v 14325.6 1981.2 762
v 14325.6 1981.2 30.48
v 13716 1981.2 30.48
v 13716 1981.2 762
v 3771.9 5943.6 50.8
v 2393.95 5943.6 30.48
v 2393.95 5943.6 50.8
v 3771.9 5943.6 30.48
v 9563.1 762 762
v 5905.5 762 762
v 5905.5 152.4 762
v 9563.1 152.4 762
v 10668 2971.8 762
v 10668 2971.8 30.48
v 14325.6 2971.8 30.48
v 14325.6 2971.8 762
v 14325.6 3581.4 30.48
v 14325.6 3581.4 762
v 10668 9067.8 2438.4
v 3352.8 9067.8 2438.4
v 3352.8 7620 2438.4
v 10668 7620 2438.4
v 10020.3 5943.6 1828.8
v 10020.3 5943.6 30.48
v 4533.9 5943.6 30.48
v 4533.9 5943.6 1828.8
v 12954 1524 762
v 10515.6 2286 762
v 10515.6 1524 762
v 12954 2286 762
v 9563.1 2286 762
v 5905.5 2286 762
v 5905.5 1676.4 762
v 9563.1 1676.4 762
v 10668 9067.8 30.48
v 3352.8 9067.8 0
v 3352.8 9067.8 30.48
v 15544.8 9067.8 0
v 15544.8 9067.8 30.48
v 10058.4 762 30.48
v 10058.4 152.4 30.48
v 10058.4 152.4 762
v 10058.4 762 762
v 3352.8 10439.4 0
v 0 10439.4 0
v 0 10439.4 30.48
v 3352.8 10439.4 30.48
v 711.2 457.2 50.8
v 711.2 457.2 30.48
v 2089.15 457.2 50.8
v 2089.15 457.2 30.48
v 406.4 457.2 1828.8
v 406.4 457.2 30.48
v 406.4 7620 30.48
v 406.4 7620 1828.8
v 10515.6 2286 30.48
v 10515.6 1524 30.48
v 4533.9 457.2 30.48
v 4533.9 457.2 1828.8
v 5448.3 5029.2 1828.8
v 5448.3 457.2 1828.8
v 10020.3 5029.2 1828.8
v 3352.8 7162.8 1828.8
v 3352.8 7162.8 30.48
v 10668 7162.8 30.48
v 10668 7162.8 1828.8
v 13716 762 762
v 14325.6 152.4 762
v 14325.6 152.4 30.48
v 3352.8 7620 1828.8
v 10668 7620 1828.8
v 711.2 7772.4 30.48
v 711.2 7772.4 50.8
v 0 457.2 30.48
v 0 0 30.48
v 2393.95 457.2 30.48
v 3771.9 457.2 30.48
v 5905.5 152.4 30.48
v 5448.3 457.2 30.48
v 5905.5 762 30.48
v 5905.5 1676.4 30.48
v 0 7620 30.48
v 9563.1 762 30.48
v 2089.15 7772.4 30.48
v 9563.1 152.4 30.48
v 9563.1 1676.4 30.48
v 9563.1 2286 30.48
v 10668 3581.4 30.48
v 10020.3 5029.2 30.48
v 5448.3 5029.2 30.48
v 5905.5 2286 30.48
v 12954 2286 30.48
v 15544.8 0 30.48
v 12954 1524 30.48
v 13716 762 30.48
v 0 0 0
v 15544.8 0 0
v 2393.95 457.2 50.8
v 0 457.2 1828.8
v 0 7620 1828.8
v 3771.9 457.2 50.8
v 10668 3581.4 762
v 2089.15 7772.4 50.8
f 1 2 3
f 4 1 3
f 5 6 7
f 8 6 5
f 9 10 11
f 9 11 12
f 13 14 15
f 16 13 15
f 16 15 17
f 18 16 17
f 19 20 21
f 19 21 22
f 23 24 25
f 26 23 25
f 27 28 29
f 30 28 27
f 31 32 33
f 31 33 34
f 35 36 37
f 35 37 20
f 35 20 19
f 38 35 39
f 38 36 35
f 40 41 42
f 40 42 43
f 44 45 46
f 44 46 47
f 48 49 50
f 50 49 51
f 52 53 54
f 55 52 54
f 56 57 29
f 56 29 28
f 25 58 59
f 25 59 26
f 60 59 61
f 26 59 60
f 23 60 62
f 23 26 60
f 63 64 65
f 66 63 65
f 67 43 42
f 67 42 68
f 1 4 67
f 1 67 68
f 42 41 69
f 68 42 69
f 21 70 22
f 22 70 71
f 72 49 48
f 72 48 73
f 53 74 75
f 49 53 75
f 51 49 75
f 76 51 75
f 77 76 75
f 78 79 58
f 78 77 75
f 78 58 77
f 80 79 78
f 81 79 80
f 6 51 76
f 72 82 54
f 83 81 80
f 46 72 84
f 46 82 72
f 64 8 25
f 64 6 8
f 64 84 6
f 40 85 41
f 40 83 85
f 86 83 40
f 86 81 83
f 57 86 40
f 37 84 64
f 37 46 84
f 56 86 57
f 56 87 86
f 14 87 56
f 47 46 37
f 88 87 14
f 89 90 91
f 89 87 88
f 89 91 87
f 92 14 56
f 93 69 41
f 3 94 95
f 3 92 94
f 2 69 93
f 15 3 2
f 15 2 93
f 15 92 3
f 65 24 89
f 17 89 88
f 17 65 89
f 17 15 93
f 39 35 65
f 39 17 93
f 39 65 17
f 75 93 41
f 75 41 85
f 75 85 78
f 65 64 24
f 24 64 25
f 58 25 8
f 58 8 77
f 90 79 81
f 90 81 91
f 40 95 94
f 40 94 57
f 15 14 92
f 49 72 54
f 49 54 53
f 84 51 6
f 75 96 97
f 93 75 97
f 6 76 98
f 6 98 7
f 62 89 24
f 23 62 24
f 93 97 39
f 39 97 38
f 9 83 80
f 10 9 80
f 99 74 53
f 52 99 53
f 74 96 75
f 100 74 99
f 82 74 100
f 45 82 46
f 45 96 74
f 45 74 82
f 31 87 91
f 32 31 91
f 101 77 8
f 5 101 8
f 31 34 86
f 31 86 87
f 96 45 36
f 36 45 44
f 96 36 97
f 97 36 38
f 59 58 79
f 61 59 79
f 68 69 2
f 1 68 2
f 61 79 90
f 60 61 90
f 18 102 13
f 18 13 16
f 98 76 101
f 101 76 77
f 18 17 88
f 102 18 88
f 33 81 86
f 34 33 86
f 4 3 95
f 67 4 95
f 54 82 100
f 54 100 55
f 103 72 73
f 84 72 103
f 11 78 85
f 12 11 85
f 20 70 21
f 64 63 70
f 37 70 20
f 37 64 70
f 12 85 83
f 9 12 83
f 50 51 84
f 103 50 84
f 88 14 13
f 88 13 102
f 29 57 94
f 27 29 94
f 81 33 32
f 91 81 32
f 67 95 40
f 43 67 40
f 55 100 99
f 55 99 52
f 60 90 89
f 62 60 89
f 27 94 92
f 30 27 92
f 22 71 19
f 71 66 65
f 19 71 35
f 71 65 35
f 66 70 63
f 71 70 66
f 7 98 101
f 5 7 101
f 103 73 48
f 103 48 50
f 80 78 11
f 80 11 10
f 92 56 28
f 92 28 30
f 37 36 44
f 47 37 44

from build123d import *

# Parameters (mm, degrees)
F0_W     = 1377.95
F0_H     = 5486.4
F0_H_2   = 7315.2
F0_W_2   = 2438.4
F0_H_3   = 762
F0_W_3   = 3352.8
F0_H_4   = 1371.6
F0_W_4   = 914.4
F0_H_5   = 2438.4
F1_DEPTH = 30.48
F0_W_5   = 406.4
F0_H_6   = 7162.8
F0_W_6   = 7315.2
F0_H_7   = 457.2
F2_DEPTH = 1828.8
F0_W_7   = 1828.8
F0_H_8   = 609.6
F3_DEPTH = 762
F0_H_9   = 1447.8
F4_DEPTH = 2438.4
F6_DEPTH = 50.8
F0_W_8   = 457.2
F0_W_9   = 4572
F0_H_10  = 914.4
F7_DEPTH = 1828.8


# Not quite as in the source:
# - the program builds the solid bodies; features that only make, move or delete a surface that nothing else refers to are left out


with BuildPart() as f1:
    # F0 (on Top) → F1 (new body)
    with BuildSketch(Plane.XY):
        Polygon((3352.8, 9067.8), (0, 9067.8), (0, 7620), (406.4, 7620), (406.4, 457.2), (0, 457.2), (0, 0), (914.4, 0), (2438.4, 0), (5486.4, 0), (7010.4, 0), (13106.4, 0), (14630.4, 0), (14630.4, 2438.4), (15544.8, 2438.4), (15544.8, 3886.2), (10668, 3886.2), (10668, 7162.8), (3352.8, 7162.8), (3352.8, 7620), align=None)
        Polygon((5905.5, 1676.4), (5905.5, 2286), (7734.3, 2286), (9563.1, 2286), (9563.1, 1676.4), (9563.1, 762), (9563.1, 152.4), (7734.3, 152.4), (5905.5, 152.4), (5905.5, 762), align=None, mode=Mode.SUBTRACT)
        with Locations((3082.925, 3200.4)):
            Rectangle(F0_W, F0_H, mode=Mode.SUBTRACT)
        with Locations((1400.175, 4114.8)):
            Rectangle(F0_W, F0_H_2, mode=Mode.SUBTRACT)
        Polygon((4533.9, 457.2), (4533.9, 5943.6), (4991.1, 5943.6), (5448.3, 5943.6), (10020.3, 5943.6), (10020.3, 5029.2), (5448.3, 5029.2), (5448.3, 457.2), (4991.1, 457.2), align=None, mode=Mode.SUBTRACT)
        Polygon((12496.8, 3581.4), (14325.6, 3581.4), (14325.6, 2971.8), (14325.6, 1981.2), (14325.6, 152.4), (13716, 152.4), (11887.2, 152.4), (10058.4, 152.4), (9867.9, 152.4), (9867.9, 3581.4), (10668, 3581.4), align=None, mode=Mode.SUBTRACT)
        Polygon((14325.6, 1981.2), (14325.6, 2971.8), (12496.8, 2971.8), (10668, 2971.8), (10668, 3581.4), (9867.9, 3581.4), (9867.9, 152.4), (10058.4, 152.4), (10058.4, 762), (11887.2, 762), (13716, 762), (13716, 1981.2), align=None)
        with Locations((11734.8, 1905)):
            Rectangle(F0_W_2, F0_H_3, mode=Mode.SUBTRACT)
        Polygon((7734.3, 1676.4), (5905.5, 1676.4), (5905.5, 762), (7734.3, 762), (9563.1, 762), (9563.1, 1676.4), align=None)
        with Locations((1676.4, 9753.6)):
            Rectangle(F0_W_3, F0_H_4)
        Polygon((15544.8, 9067.8), (10668, 9067.8), (10668, 7620), (10668, 7162.8), (10668, 3886.2), (15544.8, 3886.2), align=None)
        with Locations((15087.6, 1219.2)):
            Rectangle(F0_W_4, F0_H_5)
    extrude(amount=F1_DEPTH)

    # F0 (on Top) → F2 (join)
    with BuildSketch(Plane.XY):
        with Locations((203.2, 4038.6)):
            Rectangle(F0_W_5, F0_H_6)
        with Locations((7010.4, 7391.4)):
            Rectangle(F0_W_6, F0_H_7)
    extrude(amount=F2_DEPTH)

    # F0 (on Top) → F3 (join)
    with BuildSketch(Plane.XY):
        with Locations((6819.9, 1981.2)):
            Rectangle(F0_W_7, F0_H_8)
        with Locations((8648.7, 1981.2)):
            Rectangle(F0_W_7, F0_H_8)
        with Locations((6819.9, 457.2)):
            Rectangle(F0_W_7, F0_H_8)
        with Locations((8648.7, 457.2)):
            Rectangle(F0_W_7, F0_H_8)
        with Locations((10972.8, 457.2)):
            Rectangle(F0_W_7, F0_H_8)
        with Locations((12801.6, 457.2)):
            Rectangle(F0_W_7, F0_H_8)
        Polygon((14325.6, 152.4), (14325.6, 1981.2), (13716, 1981.2), (13716, 762), (13716, 152.4), align=None)
        with Locations((11734.8, 1905)):
            Rectangle(F0_W_2, F0_H_3)
        with Locations((11582.4, 3276.6)):
            Rectangle(F0_W_7, F0_H_8)
        with Locations((13411.2, 3276.6)):
            Rectangle(F0_W_7, F0_H_8)
    extrude(amount=F3_DEPTH)

    # F0 (on Top) → F4 (join)
    with BuildSketch(Plane.XY):
        with Locations((7010.4, 8343.9)):
            Rectangle(F0_W_6, F0_H_9)
    extrude(amount=F4_DEPTH)

    # F0 (on Top) → F6 (join)
    with BuildSketch(Plane.XY):
        with Locations((1400.175, 4114.8)):
            Rectangle(F0_W, F0_H_2)
        with Locations((3082.925, 3200.4)):
            Rectangle(F0_W, F0_H)
    extrude(amount=F6_DEPTH)

    # F0 (on Top) → F7 (join)
    with BuildSketch(Plane.XY):
        with Locations((4762.5, 3200.4)):
            Rectangle(F0_W_8, F0_H)
        Polygon((5448.3, 5943.6), (4991.1, 5943.6), (4991.1, 457.2), (5448.3, 457.2), (5448.3, 5029.2), align=None)
        with Locations((7734.3, 5486.4)):
            Rectangle(F0_W_9, F0_H_10)
    extrude(amount=F7_DEPTH)


solid = f1.part
